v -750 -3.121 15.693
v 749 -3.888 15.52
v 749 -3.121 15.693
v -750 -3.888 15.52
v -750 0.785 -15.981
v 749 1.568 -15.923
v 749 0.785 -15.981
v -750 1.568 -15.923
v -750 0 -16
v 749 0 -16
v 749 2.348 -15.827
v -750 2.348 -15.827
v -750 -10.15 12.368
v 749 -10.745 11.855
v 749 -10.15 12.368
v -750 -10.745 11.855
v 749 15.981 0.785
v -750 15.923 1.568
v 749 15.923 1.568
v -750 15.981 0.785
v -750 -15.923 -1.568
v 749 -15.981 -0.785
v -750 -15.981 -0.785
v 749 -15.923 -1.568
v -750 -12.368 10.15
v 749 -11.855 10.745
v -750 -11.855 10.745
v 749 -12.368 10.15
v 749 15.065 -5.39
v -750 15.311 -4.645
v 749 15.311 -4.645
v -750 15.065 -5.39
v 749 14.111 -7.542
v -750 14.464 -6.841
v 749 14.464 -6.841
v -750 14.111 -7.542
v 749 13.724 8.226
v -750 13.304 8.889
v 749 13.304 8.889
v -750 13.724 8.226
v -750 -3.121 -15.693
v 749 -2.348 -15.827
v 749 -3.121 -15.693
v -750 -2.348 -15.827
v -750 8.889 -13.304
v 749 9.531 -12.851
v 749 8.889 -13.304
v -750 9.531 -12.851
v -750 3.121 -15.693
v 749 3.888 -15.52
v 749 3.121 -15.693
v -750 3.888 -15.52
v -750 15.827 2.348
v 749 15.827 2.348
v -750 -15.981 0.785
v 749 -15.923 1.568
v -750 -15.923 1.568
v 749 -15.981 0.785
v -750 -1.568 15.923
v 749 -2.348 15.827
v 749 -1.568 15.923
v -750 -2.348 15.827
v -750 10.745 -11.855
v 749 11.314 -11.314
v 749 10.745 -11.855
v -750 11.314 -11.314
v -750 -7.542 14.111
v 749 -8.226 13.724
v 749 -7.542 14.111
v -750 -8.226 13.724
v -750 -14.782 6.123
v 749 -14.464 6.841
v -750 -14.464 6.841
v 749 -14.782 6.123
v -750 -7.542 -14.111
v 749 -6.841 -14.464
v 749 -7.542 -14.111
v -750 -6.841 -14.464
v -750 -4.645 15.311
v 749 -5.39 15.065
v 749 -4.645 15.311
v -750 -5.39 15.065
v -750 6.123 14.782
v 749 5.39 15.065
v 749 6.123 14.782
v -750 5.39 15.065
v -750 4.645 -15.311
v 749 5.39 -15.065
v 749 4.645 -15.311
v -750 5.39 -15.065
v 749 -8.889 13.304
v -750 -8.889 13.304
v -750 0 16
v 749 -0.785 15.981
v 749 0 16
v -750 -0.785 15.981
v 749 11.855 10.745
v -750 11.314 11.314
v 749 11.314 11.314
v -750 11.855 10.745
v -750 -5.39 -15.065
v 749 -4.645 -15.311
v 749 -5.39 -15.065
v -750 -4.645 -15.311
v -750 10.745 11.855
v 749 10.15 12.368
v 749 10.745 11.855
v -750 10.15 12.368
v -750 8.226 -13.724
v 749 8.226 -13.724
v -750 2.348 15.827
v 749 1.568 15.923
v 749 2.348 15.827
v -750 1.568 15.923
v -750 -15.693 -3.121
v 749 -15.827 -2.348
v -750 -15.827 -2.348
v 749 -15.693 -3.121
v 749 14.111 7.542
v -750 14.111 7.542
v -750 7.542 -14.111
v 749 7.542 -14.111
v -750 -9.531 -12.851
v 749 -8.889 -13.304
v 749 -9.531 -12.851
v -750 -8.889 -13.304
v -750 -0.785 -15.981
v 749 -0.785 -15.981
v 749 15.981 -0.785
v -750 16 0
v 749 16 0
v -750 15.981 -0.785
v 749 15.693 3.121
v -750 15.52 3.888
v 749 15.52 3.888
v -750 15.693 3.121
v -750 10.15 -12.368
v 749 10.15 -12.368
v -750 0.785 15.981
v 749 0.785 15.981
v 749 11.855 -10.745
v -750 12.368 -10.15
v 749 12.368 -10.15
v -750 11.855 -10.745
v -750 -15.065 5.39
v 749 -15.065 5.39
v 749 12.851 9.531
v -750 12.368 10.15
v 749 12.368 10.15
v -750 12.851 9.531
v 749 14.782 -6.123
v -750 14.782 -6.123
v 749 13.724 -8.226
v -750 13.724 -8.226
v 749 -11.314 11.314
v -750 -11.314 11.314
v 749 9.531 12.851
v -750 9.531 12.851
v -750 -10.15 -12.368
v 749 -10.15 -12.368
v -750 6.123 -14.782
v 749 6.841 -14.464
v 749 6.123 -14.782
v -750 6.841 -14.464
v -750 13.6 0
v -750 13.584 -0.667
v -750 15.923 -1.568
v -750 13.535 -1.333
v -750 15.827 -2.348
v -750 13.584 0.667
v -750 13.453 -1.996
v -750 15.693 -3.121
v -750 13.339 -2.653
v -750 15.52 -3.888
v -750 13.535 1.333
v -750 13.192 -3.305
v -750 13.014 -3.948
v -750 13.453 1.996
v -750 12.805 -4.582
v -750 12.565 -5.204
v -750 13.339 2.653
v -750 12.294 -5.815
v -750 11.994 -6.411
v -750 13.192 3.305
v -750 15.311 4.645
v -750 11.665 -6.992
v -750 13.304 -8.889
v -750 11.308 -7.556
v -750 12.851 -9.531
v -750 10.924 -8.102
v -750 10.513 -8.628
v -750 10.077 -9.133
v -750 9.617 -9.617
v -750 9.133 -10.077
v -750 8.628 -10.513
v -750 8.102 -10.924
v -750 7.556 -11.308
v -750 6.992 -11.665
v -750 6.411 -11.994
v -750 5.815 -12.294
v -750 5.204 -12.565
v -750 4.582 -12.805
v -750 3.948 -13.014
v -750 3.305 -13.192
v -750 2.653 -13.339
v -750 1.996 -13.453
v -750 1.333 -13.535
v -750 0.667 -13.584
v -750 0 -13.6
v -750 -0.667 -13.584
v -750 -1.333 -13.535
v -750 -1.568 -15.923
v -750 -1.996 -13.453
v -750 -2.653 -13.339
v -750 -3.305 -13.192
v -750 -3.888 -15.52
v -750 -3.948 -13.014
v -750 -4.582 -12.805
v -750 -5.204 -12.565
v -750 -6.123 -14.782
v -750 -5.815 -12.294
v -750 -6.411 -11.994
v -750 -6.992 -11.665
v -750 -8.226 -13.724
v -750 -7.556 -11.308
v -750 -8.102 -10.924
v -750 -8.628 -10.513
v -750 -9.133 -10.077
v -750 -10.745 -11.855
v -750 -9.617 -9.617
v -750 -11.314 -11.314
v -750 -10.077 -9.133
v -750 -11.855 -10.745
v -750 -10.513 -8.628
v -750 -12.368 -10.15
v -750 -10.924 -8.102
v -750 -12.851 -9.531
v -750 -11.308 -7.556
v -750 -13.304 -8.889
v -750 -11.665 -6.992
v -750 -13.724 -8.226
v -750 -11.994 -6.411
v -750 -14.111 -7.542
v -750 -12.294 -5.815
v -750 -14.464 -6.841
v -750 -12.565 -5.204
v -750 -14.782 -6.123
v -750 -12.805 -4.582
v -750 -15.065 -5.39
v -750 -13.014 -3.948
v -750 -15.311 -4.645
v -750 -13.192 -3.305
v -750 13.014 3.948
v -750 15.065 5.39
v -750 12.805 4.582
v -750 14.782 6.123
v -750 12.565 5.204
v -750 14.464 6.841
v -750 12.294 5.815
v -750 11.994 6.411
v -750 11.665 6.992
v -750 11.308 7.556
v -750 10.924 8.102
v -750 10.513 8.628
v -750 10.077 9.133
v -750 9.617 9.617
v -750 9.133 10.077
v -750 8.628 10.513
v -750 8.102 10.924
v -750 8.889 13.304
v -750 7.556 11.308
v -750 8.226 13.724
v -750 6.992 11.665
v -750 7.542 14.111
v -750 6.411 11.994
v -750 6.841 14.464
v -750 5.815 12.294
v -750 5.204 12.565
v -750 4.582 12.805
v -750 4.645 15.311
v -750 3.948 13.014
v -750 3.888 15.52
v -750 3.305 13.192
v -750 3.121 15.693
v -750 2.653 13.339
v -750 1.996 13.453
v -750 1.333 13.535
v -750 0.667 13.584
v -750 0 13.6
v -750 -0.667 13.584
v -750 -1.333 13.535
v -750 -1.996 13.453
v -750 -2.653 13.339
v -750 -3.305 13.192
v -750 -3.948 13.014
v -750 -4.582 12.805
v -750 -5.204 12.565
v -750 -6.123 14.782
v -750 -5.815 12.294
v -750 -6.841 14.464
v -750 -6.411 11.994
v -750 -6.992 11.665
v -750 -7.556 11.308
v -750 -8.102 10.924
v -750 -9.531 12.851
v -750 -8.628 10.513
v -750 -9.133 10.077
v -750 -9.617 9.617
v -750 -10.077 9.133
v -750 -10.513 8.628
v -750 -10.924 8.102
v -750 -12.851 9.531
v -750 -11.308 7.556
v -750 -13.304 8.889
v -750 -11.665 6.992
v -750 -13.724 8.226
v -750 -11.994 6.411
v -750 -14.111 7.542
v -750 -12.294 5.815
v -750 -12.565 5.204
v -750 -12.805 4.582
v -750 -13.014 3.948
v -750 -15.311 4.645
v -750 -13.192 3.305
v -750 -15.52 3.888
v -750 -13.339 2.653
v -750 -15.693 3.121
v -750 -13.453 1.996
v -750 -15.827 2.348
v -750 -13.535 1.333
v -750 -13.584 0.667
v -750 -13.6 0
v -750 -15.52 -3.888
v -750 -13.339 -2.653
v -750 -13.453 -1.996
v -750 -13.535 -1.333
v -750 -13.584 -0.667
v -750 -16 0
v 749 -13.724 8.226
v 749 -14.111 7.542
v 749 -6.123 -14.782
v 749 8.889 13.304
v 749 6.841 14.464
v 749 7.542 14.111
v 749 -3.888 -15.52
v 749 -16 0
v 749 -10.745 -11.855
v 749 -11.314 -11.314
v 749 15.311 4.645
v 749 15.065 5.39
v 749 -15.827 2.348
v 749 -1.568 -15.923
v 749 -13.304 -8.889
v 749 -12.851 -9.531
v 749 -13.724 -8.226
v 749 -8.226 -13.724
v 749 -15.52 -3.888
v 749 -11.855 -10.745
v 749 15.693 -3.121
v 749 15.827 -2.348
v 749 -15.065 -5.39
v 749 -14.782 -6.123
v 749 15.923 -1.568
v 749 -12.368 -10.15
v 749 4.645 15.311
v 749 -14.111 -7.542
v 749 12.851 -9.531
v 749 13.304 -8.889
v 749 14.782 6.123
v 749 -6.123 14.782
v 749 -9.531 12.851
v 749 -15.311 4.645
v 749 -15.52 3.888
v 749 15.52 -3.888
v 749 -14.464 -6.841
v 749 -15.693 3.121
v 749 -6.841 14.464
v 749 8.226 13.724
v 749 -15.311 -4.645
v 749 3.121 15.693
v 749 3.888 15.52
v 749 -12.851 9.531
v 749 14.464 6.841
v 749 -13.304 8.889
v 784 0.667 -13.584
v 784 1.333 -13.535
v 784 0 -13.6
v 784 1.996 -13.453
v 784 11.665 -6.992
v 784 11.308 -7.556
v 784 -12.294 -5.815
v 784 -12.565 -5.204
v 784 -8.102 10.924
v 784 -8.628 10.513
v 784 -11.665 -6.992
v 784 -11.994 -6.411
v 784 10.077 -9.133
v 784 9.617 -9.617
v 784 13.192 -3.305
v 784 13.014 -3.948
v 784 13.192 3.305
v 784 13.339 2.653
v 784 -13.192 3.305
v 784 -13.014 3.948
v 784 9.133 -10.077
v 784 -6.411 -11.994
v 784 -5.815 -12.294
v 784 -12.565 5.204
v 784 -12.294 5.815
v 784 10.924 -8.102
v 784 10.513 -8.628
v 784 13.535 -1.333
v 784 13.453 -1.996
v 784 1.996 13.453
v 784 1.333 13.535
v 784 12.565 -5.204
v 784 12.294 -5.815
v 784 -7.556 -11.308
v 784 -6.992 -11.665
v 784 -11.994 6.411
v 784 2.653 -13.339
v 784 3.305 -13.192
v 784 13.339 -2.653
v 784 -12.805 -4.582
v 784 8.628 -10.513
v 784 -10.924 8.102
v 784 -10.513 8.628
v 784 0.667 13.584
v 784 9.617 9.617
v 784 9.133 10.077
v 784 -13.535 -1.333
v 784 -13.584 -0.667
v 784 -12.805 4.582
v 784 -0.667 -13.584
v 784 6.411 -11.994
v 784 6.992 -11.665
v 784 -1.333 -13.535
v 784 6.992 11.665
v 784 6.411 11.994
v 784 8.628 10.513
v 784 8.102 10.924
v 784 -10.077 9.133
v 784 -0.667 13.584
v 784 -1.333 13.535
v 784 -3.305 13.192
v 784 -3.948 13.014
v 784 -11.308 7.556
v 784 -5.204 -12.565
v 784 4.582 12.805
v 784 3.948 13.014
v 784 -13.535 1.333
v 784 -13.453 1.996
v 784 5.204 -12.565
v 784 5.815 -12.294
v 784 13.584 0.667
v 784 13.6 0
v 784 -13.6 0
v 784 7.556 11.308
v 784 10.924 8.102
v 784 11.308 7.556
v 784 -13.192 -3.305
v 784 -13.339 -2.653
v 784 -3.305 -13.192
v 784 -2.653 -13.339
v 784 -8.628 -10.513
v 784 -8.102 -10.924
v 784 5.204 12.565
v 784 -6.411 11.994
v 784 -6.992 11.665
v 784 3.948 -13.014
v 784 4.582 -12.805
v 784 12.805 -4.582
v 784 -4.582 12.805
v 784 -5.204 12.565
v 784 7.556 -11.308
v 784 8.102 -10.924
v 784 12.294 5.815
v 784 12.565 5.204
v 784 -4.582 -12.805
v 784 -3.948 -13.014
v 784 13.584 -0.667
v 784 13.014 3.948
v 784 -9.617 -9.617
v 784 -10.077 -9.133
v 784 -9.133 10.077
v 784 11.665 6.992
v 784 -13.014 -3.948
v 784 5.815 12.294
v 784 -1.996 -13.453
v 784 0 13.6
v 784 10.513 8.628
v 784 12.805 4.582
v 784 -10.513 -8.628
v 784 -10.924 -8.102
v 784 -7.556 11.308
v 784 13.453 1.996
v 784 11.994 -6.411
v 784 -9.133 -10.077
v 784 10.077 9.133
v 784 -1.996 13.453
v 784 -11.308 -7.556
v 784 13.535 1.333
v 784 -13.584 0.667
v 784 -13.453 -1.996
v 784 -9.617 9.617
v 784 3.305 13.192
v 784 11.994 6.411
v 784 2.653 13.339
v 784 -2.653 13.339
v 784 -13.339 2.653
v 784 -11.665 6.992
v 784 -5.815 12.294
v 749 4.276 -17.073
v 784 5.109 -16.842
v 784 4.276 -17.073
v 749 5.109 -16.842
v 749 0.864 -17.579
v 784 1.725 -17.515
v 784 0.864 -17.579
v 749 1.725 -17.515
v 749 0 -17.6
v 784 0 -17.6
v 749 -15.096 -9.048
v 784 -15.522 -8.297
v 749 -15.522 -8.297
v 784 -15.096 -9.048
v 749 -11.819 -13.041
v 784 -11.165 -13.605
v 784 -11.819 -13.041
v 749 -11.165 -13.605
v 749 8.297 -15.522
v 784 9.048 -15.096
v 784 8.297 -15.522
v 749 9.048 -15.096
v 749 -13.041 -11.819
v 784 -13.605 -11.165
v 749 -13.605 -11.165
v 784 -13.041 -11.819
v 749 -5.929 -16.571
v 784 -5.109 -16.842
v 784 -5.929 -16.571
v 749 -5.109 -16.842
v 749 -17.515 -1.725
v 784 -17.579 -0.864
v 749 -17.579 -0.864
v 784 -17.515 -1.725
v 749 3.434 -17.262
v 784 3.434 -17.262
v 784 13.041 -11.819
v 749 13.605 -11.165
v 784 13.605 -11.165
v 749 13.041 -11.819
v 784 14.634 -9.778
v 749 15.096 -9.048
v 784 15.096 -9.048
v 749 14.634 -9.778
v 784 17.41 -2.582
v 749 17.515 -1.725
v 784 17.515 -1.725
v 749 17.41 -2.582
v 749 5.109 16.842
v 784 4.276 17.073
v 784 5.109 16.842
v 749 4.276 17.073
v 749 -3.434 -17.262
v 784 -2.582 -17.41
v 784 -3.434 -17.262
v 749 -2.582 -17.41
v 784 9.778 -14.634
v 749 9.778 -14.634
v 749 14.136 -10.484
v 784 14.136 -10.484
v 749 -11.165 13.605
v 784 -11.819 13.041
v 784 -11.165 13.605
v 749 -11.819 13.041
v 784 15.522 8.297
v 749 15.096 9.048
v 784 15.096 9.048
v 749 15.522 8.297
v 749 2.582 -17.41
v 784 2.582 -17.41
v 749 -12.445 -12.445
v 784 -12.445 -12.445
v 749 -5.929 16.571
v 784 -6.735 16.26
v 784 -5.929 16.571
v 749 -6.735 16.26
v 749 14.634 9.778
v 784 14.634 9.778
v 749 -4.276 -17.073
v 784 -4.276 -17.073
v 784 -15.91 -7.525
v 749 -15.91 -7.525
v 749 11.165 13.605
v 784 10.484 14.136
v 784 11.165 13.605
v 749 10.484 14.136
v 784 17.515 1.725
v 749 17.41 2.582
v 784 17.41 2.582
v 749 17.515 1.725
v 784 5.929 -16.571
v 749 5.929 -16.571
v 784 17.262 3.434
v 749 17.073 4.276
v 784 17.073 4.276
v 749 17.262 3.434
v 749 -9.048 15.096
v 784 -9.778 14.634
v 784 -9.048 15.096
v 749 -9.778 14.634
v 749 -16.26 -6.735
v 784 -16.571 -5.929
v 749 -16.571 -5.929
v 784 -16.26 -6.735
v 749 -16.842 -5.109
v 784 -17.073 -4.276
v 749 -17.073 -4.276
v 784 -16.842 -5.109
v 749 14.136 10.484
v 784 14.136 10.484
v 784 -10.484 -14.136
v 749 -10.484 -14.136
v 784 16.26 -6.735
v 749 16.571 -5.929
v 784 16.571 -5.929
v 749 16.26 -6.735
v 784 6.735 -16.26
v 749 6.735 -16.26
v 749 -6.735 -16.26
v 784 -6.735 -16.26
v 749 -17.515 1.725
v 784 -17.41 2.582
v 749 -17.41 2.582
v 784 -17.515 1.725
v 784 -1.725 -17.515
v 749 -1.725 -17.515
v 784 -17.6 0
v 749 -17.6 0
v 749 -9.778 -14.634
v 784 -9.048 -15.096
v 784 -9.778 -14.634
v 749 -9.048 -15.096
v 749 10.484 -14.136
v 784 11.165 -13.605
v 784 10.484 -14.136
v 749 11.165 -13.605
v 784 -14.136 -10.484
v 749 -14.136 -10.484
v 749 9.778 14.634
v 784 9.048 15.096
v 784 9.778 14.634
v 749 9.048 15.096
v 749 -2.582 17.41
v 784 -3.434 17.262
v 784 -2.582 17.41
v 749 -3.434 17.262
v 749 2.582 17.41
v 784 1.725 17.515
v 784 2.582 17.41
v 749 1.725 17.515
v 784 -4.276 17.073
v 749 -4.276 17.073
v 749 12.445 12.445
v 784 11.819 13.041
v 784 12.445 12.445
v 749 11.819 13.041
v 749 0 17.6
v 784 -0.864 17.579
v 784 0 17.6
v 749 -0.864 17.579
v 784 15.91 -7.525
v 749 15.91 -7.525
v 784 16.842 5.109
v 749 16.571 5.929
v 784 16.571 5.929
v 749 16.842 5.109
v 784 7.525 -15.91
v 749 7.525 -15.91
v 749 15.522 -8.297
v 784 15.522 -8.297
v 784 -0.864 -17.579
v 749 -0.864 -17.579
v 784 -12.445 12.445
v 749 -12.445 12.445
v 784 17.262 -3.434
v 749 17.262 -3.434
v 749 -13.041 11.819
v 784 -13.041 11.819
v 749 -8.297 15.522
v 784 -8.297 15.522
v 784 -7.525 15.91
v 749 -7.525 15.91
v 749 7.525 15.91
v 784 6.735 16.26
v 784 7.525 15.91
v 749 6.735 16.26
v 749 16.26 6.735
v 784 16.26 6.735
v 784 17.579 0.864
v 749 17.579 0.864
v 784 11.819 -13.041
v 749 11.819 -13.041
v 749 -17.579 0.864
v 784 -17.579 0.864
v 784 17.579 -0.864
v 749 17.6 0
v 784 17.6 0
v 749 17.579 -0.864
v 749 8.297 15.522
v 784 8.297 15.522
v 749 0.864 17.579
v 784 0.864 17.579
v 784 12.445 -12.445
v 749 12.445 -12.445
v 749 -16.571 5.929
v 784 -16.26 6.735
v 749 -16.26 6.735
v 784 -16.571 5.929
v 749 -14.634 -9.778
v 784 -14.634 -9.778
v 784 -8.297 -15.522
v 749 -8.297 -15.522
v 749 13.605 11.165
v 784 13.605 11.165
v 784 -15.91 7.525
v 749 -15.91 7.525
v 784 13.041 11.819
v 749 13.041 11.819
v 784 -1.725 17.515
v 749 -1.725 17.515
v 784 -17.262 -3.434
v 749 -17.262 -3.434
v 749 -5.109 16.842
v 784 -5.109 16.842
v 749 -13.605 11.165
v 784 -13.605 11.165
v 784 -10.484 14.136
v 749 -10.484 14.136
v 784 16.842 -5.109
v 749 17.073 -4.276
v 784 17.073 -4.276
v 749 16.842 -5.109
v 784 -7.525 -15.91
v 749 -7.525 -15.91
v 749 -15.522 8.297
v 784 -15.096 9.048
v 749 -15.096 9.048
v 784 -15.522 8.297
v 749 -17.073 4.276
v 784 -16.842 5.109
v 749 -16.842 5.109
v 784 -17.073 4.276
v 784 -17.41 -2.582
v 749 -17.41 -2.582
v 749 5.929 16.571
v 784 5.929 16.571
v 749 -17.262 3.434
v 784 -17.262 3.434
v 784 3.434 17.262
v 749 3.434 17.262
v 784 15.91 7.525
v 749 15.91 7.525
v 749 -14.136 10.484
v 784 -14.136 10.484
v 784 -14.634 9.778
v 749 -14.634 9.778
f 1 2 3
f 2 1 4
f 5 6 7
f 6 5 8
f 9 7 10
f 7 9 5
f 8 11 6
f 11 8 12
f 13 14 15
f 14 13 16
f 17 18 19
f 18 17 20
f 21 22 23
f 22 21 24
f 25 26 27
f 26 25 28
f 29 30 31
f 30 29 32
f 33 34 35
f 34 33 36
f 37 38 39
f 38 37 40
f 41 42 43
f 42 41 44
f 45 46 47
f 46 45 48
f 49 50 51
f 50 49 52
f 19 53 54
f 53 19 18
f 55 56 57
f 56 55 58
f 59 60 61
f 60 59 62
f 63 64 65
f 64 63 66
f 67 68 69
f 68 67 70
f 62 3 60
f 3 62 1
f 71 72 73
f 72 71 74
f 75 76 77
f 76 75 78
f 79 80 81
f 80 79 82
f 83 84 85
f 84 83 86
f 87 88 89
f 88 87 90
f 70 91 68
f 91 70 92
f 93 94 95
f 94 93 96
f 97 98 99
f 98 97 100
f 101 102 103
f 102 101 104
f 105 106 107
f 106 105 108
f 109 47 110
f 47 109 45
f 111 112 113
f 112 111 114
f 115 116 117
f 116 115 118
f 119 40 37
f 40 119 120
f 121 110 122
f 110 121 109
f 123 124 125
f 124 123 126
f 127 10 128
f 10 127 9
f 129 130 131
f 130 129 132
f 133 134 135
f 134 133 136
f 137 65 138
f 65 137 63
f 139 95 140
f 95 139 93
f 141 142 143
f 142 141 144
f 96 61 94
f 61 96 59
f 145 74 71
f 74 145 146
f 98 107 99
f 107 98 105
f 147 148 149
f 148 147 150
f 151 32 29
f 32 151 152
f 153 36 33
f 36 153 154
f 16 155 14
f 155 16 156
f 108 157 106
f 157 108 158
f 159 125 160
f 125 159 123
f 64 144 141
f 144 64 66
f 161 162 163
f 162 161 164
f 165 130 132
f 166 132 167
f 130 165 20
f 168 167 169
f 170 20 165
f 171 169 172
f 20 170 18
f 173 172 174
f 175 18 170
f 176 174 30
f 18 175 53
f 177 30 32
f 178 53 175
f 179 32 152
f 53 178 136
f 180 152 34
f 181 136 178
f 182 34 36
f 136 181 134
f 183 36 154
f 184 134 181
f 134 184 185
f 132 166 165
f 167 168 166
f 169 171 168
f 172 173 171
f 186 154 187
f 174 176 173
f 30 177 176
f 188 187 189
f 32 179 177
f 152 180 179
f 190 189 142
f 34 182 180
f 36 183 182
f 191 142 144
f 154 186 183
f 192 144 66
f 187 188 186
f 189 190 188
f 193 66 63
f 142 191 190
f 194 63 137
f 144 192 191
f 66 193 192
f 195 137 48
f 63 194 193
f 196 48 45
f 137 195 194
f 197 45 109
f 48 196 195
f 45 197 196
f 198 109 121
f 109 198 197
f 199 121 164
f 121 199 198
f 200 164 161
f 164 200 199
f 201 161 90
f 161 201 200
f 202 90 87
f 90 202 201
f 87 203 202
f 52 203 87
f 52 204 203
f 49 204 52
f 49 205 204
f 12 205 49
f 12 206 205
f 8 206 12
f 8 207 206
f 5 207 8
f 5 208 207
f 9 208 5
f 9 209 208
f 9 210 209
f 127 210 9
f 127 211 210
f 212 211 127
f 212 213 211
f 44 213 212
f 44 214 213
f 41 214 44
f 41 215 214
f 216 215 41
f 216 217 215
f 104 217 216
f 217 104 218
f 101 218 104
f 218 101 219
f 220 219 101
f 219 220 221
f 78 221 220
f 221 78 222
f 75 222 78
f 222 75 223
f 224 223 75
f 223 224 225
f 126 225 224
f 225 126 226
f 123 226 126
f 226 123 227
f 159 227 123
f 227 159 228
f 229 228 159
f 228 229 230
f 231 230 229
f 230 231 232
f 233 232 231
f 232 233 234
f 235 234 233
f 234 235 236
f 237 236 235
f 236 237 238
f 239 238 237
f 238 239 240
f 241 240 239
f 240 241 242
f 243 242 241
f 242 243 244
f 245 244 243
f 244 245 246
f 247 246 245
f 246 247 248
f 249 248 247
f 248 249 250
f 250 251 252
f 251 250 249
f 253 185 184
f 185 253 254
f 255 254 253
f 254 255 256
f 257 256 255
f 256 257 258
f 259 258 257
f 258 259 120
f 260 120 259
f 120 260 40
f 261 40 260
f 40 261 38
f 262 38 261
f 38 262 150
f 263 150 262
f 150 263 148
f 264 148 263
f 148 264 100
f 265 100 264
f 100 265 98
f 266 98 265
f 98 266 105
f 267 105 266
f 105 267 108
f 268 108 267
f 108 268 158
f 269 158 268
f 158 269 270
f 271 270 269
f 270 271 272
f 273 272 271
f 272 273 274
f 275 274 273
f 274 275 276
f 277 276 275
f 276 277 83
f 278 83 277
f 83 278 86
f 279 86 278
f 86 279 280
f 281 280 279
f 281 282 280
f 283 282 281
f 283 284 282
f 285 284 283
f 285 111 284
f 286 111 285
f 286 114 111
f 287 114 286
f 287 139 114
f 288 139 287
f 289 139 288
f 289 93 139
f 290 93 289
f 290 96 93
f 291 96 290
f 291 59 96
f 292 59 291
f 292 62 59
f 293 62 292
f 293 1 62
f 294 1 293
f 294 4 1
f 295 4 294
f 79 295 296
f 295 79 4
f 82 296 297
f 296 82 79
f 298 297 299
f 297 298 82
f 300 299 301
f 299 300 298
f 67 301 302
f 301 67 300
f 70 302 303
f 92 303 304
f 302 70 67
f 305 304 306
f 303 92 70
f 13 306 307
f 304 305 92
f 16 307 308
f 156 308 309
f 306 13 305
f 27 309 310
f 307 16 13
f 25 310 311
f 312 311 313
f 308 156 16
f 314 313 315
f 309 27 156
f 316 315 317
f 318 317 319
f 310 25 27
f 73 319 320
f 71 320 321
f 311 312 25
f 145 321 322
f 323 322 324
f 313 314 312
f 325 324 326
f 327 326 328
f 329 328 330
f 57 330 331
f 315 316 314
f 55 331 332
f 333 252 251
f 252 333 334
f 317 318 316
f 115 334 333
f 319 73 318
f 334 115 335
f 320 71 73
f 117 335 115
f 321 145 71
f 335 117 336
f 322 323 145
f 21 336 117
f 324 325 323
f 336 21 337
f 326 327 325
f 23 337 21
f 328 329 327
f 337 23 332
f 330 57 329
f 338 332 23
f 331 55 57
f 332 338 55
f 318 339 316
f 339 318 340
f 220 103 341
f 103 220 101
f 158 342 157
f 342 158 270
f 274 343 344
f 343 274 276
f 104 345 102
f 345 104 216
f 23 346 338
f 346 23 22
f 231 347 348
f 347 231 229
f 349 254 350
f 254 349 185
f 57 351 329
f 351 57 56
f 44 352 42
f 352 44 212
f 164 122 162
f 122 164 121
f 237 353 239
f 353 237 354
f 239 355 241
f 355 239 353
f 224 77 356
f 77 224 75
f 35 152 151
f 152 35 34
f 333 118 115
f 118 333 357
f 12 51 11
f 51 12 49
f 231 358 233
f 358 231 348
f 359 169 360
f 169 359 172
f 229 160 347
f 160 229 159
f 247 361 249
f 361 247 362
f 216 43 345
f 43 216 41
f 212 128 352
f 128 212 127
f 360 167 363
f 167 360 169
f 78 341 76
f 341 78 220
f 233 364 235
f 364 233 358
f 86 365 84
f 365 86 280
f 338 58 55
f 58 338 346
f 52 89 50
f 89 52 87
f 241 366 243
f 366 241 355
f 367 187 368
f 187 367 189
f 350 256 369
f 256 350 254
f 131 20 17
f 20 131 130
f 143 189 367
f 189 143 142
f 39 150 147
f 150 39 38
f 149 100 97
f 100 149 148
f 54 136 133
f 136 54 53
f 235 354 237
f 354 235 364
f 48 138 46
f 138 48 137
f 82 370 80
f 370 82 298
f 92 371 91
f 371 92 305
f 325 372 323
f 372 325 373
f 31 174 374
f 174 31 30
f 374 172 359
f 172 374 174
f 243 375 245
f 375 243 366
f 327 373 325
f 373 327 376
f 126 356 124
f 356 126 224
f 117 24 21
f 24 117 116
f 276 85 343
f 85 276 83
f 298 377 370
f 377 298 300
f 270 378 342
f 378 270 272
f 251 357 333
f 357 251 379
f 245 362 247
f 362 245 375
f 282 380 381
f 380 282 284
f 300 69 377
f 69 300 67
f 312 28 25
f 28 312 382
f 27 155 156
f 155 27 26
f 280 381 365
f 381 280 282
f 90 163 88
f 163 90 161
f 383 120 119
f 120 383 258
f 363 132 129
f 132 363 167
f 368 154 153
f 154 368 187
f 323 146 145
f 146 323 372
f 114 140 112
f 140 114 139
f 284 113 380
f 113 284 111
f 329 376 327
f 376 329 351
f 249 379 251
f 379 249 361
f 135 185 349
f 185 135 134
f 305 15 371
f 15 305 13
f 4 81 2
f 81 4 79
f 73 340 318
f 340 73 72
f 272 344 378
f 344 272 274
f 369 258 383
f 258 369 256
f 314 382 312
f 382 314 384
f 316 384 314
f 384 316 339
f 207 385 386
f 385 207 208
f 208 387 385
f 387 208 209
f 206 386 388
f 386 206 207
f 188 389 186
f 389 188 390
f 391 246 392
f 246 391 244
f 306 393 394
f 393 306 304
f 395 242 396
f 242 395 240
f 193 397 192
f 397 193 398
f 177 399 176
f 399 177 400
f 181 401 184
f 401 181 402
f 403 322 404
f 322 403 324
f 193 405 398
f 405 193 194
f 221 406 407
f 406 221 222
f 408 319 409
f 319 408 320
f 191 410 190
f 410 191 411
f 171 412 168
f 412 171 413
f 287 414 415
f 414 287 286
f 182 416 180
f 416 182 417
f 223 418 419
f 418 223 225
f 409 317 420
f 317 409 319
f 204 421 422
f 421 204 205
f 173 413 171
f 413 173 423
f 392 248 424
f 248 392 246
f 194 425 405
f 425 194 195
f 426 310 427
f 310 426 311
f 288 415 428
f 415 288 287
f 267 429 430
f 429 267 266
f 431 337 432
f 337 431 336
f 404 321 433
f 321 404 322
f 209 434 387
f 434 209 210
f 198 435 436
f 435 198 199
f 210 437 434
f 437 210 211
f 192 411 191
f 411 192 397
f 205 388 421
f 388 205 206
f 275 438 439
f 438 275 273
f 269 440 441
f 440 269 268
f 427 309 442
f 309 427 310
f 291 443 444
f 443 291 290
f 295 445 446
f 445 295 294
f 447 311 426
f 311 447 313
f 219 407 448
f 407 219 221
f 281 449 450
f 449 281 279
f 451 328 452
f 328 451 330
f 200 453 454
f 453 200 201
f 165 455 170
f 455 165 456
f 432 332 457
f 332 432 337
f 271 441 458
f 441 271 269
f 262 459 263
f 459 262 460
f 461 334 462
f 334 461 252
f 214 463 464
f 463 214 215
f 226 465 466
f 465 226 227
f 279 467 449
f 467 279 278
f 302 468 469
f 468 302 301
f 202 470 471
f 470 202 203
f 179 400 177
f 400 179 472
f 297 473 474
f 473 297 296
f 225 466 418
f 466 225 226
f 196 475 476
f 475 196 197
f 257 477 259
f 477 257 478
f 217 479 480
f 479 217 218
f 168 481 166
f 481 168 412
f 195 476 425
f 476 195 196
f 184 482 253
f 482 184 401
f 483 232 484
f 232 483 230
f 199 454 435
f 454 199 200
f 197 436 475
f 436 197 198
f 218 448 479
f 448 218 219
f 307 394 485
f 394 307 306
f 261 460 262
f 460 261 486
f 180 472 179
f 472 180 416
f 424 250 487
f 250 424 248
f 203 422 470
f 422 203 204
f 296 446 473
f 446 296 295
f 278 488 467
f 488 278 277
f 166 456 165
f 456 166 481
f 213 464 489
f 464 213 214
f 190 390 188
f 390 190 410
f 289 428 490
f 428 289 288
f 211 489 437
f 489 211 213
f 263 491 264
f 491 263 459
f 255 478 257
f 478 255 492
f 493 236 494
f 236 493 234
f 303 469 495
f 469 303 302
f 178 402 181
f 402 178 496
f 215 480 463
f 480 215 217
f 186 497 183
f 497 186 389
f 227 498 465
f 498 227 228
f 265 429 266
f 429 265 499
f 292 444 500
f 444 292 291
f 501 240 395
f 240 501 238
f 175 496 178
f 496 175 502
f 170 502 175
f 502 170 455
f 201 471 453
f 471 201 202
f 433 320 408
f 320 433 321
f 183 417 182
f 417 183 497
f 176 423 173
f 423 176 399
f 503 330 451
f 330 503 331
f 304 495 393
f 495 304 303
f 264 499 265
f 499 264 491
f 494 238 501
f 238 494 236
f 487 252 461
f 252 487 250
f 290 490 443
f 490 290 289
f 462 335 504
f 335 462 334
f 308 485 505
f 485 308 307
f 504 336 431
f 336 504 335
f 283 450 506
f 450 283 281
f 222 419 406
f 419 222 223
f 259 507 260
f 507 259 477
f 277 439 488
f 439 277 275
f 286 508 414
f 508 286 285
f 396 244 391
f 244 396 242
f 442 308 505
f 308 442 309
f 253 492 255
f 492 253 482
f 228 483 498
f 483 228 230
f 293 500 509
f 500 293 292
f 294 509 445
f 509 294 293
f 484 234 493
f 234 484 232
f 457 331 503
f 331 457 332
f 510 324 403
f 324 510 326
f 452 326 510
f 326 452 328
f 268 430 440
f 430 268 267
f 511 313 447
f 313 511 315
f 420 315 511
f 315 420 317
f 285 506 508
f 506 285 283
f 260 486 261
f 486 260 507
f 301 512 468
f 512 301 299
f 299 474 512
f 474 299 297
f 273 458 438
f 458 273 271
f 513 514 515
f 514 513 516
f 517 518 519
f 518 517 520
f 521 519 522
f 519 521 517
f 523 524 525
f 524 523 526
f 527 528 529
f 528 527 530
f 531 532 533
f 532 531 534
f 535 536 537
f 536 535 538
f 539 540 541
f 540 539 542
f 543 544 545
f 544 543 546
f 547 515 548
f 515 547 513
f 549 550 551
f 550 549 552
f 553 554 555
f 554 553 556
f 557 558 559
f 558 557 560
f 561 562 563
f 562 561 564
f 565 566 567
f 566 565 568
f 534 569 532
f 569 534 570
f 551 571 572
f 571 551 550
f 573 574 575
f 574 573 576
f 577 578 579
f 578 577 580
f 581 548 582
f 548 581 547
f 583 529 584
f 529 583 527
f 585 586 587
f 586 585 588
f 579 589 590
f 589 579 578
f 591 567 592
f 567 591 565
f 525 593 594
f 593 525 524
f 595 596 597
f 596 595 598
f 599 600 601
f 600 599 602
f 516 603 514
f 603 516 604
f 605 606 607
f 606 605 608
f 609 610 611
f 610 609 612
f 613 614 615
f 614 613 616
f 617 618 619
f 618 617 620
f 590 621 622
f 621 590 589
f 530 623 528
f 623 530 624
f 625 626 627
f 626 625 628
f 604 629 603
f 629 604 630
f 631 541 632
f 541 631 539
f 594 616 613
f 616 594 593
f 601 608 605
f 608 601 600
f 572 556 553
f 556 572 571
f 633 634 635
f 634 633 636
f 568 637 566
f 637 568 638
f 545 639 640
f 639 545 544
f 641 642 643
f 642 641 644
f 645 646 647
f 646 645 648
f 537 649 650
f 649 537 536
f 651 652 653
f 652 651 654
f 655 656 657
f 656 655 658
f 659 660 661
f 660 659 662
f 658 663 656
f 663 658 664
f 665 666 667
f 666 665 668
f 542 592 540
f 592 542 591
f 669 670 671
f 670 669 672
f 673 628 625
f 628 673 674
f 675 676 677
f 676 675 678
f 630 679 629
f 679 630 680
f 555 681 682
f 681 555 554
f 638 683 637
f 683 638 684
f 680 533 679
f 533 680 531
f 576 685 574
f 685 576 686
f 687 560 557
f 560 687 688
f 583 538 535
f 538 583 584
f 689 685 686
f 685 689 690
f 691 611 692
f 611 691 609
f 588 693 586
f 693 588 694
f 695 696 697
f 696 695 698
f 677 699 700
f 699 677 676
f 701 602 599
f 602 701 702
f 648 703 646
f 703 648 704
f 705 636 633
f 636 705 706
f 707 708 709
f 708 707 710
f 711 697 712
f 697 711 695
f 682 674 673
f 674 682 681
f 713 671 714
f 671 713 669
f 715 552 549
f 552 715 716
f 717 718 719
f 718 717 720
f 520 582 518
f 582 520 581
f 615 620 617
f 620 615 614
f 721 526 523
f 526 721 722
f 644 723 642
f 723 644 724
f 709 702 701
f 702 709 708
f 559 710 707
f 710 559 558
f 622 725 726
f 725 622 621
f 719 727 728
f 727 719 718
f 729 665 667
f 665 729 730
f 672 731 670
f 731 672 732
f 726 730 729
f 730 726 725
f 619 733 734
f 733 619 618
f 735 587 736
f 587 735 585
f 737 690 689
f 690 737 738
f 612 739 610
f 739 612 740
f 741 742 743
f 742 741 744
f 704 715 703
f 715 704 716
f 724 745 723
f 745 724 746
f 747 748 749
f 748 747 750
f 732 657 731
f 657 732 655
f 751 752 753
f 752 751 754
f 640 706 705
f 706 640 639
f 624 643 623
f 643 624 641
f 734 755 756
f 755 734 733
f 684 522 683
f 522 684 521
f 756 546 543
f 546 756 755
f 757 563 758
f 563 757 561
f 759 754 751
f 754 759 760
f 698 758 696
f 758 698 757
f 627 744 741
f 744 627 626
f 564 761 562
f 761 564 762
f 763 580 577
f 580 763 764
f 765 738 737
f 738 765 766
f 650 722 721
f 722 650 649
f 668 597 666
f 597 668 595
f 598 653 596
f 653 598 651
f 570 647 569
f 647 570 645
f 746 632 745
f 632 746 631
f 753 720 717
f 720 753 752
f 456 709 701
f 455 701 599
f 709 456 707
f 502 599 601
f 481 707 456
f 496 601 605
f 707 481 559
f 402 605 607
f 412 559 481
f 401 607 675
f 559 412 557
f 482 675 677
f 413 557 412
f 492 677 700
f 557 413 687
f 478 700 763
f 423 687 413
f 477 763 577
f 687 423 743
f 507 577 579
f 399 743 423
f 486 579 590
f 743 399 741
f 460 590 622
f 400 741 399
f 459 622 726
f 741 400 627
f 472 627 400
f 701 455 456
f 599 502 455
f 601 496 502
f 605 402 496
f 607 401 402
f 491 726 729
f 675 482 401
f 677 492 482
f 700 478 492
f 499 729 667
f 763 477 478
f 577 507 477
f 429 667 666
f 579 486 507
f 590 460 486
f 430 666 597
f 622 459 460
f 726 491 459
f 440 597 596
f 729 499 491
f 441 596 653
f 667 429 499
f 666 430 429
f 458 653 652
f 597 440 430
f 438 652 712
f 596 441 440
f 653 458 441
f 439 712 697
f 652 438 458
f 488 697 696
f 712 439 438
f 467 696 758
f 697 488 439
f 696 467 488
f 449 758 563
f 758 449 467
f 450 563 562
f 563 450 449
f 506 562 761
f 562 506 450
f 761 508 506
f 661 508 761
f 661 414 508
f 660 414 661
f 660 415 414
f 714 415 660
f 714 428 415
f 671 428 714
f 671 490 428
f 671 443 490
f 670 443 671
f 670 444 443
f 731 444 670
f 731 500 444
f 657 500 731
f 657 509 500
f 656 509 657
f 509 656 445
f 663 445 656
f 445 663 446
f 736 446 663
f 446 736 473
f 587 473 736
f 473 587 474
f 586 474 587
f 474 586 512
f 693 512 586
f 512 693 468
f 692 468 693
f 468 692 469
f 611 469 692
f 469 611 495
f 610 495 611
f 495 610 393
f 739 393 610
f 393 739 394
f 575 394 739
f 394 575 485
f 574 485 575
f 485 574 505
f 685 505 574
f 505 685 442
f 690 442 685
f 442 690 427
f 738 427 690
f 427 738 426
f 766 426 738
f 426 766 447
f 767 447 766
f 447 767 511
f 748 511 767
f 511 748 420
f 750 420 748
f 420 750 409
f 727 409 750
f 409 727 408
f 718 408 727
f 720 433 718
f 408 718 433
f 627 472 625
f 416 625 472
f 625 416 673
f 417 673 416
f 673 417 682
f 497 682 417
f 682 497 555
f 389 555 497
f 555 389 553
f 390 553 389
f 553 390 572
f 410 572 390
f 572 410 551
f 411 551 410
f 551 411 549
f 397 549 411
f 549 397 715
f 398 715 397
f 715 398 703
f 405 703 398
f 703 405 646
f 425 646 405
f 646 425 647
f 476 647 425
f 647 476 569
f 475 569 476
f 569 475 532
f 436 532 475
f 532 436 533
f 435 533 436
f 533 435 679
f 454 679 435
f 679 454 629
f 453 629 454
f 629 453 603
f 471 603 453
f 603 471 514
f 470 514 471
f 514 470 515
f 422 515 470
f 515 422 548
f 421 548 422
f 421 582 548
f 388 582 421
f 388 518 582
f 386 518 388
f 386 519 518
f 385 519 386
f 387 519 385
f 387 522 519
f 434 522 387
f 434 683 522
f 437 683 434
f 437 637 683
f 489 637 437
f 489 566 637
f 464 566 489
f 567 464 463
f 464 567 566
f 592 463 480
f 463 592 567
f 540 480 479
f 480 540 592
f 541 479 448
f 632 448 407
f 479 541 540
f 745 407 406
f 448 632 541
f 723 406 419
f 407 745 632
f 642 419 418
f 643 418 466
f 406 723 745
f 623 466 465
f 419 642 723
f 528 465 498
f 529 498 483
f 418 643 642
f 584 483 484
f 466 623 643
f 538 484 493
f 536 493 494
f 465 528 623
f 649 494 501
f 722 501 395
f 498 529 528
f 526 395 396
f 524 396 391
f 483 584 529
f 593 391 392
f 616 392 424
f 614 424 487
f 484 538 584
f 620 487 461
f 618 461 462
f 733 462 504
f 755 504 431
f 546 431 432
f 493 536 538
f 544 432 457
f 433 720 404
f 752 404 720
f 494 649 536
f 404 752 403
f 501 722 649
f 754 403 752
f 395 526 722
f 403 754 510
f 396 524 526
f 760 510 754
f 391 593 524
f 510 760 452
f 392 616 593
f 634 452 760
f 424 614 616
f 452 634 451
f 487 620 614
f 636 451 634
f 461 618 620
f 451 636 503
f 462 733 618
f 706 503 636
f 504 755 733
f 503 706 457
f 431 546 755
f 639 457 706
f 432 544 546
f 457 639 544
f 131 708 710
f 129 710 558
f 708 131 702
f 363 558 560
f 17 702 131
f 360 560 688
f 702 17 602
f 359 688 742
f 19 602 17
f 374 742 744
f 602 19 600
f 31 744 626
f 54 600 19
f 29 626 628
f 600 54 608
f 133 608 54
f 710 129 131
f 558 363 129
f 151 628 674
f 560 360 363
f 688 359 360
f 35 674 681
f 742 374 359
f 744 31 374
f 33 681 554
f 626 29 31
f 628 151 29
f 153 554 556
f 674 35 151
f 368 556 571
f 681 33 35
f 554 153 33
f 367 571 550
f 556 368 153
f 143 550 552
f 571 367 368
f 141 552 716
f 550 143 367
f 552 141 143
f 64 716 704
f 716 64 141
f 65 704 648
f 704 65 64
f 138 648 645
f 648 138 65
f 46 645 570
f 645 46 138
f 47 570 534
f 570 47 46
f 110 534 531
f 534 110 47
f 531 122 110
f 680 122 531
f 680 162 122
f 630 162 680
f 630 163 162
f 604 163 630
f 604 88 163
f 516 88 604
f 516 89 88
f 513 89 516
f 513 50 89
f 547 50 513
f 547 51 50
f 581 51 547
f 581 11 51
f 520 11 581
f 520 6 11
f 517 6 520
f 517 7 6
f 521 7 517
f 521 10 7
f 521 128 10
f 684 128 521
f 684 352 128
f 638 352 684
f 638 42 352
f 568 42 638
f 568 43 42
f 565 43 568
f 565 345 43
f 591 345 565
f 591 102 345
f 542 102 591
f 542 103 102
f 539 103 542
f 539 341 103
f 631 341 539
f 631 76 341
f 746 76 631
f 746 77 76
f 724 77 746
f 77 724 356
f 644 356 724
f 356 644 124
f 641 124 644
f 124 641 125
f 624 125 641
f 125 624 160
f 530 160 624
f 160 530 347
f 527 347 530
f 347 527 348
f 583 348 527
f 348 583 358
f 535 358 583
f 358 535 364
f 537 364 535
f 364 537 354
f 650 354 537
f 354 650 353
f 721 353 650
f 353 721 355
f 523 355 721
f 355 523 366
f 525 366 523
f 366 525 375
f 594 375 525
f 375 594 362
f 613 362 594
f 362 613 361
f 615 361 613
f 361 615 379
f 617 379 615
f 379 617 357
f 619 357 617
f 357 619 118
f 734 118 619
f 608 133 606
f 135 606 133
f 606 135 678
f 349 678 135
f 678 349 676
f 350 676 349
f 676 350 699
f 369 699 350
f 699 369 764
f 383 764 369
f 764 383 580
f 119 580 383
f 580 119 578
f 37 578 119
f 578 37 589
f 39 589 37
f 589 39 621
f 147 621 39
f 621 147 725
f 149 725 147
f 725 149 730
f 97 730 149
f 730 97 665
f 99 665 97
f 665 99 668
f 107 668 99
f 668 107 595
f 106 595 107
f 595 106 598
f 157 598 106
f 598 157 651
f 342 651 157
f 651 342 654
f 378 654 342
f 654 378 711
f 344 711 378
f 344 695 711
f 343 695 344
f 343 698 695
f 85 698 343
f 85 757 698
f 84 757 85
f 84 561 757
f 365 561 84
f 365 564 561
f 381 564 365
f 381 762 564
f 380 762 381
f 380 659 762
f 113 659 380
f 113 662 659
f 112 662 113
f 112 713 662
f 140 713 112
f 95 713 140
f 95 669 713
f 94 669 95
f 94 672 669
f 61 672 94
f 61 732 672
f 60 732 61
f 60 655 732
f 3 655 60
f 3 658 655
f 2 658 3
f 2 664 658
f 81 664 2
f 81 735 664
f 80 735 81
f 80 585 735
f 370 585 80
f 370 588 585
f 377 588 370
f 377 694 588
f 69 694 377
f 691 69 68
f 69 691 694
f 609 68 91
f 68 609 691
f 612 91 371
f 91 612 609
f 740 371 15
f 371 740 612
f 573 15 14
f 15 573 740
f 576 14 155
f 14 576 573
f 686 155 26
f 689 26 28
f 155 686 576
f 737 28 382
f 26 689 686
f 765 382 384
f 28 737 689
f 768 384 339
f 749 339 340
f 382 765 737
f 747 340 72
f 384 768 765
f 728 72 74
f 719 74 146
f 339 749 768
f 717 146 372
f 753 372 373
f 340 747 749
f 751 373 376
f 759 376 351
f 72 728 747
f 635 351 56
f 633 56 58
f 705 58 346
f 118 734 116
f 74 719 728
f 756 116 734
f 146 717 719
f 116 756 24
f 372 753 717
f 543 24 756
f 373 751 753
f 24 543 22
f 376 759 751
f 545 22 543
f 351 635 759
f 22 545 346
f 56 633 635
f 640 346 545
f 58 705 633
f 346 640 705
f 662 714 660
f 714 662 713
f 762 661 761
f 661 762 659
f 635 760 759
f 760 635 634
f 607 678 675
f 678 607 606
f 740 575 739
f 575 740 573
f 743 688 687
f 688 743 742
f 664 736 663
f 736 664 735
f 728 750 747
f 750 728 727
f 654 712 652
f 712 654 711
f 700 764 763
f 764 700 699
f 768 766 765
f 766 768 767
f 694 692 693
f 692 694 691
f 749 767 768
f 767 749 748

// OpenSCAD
// HT 32 pipe 1500 mm (single connected solid, oriented along X for reliable orthographic views)

$fn = 128;

// Parameters
nominal_diameter_mm = 32; //[16:64:1]
length_mm = 1500; //[750:3000:10]
include_end_fitting = 1; //[0:1:1]

pipe_od_mm = 32; //[16:64:1]
pipe_wall_mm = 2.4; //[1.2:4.8:0.1]

fit_overlap_mm = 1; //[0.5:2:0.1]
fitting_length_mm = 35; //[18:70:1]
fitting_od_mm = 35.2; //[17.6:70.4:0.1]

// Derived
pipe_r = pipe_od_mm/2;
pipe_ir = max(0.01, pipe_r - pipe_wall_mm);

fitting_r = fitting_od_mm/2;
fitting_ir = pipe_ir;

// Small overlap to guarantee manifold union between parts
join_eps = max(0.2, fit_overlap_mm);

module hollow_cyl(h, r_outer, r_inner) {
  difference() {
    cylinder(h=h, r=r_outer, center=true);
    cylinder(h=h + 2*join_eps, r=r_inner, center=true);
  }
}

module ht_pipe() {
  color([0.85, 0.85, 0.8])
  rotate([0, 90, 0])  // orient pipe along X so front/back/left/right views are not degenerate
  union() {
    // Main pipe (centered)
    hollow_cyl(length_mm, pipe_r, pipe_ir);

    // End fitting at +X end (after rotation), connected with calculated overlap
    if (include_end_fitting) {
      translate([0, 0, length_mm/2 + fitting_length_mm/2 - join_eps])
        hollow_cyl(fitting_length_mm, fitting_r, fitting_ir);
    }
  }
}

ht_pipe();
